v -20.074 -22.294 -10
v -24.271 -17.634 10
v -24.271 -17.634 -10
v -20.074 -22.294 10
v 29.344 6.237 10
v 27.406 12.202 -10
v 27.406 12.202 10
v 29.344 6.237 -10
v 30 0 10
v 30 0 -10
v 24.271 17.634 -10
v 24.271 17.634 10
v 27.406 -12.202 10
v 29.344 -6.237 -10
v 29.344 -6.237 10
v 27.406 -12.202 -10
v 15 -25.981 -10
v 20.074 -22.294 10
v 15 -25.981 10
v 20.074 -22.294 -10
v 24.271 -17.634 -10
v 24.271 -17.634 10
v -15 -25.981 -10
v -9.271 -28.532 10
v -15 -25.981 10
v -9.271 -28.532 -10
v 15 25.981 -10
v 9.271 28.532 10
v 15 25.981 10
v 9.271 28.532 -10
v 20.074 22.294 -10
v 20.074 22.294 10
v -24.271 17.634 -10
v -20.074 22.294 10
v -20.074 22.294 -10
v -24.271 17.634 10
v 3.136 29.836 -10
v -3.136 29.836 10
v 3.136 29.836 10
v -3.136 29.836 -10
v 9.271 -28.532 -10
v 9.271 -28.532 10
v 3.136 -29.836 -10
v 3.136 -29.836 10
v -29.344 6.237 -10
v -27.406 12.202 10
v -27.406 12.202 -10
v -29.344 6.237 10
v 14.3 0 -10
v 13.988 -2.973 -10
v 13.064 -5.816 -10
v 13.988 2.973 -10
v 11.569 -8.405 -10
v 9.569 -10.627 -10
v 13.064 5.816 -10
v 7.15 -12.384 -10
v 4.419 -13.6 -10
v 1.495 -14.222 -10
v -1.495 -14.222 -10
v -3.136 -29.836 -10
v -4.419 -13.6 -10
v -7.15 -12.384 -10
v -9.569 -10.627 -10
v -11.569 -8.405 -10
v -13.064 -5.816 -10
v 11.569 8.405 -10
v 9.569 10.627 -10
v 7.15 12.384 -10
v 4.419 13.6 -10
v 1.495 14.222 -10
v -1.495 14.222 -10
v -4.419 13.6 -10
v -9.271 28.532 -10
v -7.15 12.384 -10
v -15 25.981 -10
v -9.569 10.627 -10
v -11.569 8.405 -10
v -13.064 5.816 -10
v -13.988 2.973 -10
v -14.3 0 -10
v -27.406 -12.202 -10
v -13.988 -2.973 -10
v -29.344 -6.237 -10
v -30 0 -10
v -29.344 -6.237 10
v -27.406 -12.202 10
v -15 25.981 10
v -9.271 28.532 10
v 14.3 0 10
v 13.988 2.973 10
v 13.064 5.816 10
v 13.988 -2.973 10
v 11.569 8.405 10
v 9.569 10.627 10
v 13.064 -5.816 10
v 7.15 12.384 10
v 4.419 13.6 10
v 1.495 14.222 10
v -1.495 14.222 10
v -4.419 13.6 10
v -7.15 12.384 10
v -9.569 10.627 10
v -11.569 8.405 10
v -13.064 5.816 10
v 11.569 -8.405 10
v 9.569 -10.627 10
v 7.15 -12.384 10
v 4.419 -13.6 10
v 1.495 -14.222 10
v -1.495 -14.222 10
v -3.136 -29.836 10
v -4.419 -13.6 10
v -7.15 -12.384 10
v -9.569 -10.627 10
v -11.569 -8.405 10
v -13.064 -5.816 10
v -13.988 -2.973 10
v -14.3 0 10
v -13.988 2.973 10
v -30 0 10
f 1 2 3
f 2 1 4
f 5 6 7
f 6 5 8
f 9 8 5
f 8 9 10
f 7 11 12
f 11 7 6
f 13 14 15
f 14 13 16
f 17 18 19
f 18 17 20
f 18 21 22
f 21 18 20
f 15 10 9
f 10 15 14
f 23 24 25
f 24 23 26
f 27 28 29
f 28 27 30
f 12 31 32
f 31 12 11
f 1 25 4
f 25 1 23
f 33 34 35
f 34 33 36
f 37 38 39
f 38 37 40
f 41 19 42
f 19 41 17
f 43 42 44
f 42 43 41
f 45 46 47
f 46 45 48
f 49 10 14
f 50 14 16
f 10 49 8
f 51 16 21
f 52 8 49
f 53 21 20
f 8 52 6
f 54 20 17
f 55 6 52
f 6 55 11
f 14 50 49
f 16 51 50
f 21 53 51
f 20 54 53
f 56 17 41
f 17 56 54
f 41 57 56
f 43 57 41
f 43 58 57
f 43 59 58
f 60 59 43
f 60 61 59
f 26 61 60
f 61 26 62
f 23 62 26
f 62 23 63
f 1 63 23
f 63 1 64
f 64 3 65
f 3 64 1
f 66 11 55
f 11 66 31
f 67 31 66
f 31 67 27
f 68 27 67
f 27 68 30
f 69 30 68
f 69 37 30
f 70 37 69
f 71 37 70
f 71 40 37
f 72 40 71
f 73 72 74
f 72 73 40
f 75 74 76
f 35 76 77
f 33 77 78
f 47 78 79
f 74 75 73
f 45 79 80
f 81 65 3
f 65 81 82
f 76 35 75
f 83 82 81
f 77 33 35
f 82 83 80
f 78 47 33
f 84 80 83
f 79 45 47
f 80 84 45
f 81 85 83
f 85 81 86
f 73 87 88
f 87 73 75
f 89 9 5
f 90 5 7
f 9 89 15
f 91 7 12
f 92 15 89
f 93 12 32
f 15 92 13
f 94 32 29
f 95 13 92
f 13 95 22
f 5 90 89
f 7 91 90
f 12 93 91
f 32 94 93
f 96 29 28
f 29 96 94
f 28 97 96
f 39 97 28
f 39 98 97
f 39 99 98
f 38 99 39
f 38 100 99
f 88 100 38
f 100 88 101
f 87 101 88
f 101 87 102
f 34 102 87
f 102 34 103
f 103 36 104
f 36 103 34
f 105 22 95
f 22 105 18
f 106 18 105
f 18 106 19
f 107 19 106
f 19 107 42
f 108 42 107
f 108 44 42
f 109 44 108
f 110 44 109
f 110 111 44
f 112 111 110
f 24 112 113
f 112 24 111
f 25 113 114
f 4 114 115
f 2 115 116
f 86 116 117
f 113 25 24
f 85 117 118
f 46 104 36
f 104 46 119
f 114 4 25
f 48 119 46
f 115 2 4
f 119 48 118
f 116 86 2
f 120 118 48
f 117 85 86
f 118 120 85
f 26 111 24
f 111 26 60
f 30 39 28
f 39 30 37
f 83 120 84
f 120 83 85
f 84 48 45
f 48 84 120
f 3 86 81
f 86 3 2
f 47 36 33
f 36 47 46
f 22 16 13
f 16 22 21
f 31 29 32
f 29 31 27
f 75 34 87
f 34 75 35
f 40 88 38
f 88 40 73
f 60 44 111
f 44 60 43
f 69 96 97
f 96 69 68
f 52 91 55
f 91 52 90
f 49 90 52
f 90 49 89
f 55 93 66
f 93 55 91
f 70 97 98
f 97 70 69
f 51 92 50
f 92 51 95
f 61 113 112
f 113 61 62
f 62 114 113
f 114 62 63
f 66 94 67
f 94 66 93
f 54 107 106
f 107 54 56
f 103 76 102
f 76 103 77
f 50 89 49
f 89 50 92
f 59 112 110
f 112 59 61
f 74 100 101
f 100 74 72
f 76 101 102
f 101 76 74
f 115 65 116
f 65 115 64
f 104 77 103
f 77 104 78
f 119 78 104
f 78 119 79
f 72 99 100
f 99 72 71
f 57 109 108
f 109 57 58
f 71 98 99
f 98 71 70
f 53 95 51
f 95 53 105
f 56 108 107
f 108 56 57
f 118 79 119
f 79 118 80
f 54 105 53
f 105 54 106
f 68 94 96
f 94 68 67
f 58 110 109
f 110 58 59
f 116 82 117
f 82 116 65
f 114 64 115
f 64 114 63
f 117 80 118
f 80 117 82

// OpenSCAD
zero = 0.001;
infinite = 100000;

hole_tolerance = 0.3;

base_height = 20;
base_external_diameter = 60;
base_internal_diameter = 28 + hole_tolerance;


module base_ring() {
  difference() {
    cylinder(h = base_height, d = base_external_diameter, center = true);

    cylinder(h = base_height + hole_tolerance, d = base_internal_diameter + hole_tolerance, center = true);
    
    cube([10,13, base_height + hole_tolerance], center = true);  
  }
}


base_ring();

module MainRing() { 
  difference() {
    difference() {
      cylinder(h = 20, r = 30);
      cylinder(h = 20, r = 14);
      translate([9,-6.5,0])
        cube([10,13,20]);  
      intersection() {
        cylinder(h = 20, r = 15);
        translate([-8, -20, 0])
          cube([16, 40, 20]);  
      }
    }
    // пазы для венгерки на фонарь
    rotate([0, 0, 195])
      translate([27, -1.5, 0])
        cube([3, 3, 20]);  
    rotate([0, 0, 165])
      translate([27, -1.5, 0])
        cube([3, 3, 20]);  
  }
};

// круглый паз
module CurvedSlot() {
  intersection() {
    difference() {
      sphere(r = 20);
      sphere(r = 12);
    }
    translate([-1.5, 0, 0])    
      cube([3, 12, 20]);
  }
};

// гайка
module Nut() {
  difference() {
    intersection() {
      translate([-4, -4, 0])
        cube([8, 8, 4]);
      rotate([0, 0, 45])
        translate([-4, -4, 0])
          cube([8, 8, 4]);
    }
    cylinder(h = 4, r = 2);
  }
};

// головка болта
module ScrewHead() {
  cylinder(h = 3, r1 = 4.5, r2 = 2.5, center = false);
};

/*
// собираем все в кучу
difference() {
  MainRing();
  // отверстия для болтов
  for (i = [1 : 8])
  {
    rotate([0, 0, 45 * i])
    translate([10, 0, 10])
    rotate([0, 90, 0])
      cylinder(h = 30, r = 2.5);
  }
  // пазы для венгерки стоек
  for (i = [1 : 2])
  {
    rotate([0, 0, 90 * i])
      translate([0, 18, 10])
        rotate([0, 30, 0])
          CurvedSlot();
  }
  for (i = [1 : 2])
  {
    rotate([0, 0, 180 + 90 * i])
      translate([0, 18, 10])
        rotate([0, -30, 0])
          CurvedSlot();
  }
  for (i = [1 : 2])
  {
    rotate([0, 0, 45 + 90 * i])
      translate([0, 18, 10])
        rotate([0, 30, 0])
          rotate([0, 180, 0])
            CurvedSlot();
  }
  for (i = [1 : 2])
  {
    rotate([0, 0, 225 + 90 * i])
      translate([0, 18, 10])
        rotate([0, -30, 0])
          rotate([0, 180, 0])
            CurvedSlot();
  }
  // шестигранники для гаек
  for (i = [1 : 8])
  {
    rotate([0, 0, 45 * i])
      translate([26, 0, 10])
        rotate([0, 90, 0])
          Nut();
  }
  // головки болтов
  for (i = [1, 3, 4, 5, 7])
  {
    rotate([0, 0, 45 * i])
      translate([13.5, 0, 10])
        rotate([0, 90, 0])
          ScrewHead();
  };
  for (i = [2, 6])
  {
    rotate([0, 0, 45 * i])
      translate([14.5, 0, 10])
        rotate([0, 90, 0])
          ScrewHead();
  };
  translate([18.5, 0, 10])
    rotate([0, 90, 0])
      ScrewHead();
};
*/
